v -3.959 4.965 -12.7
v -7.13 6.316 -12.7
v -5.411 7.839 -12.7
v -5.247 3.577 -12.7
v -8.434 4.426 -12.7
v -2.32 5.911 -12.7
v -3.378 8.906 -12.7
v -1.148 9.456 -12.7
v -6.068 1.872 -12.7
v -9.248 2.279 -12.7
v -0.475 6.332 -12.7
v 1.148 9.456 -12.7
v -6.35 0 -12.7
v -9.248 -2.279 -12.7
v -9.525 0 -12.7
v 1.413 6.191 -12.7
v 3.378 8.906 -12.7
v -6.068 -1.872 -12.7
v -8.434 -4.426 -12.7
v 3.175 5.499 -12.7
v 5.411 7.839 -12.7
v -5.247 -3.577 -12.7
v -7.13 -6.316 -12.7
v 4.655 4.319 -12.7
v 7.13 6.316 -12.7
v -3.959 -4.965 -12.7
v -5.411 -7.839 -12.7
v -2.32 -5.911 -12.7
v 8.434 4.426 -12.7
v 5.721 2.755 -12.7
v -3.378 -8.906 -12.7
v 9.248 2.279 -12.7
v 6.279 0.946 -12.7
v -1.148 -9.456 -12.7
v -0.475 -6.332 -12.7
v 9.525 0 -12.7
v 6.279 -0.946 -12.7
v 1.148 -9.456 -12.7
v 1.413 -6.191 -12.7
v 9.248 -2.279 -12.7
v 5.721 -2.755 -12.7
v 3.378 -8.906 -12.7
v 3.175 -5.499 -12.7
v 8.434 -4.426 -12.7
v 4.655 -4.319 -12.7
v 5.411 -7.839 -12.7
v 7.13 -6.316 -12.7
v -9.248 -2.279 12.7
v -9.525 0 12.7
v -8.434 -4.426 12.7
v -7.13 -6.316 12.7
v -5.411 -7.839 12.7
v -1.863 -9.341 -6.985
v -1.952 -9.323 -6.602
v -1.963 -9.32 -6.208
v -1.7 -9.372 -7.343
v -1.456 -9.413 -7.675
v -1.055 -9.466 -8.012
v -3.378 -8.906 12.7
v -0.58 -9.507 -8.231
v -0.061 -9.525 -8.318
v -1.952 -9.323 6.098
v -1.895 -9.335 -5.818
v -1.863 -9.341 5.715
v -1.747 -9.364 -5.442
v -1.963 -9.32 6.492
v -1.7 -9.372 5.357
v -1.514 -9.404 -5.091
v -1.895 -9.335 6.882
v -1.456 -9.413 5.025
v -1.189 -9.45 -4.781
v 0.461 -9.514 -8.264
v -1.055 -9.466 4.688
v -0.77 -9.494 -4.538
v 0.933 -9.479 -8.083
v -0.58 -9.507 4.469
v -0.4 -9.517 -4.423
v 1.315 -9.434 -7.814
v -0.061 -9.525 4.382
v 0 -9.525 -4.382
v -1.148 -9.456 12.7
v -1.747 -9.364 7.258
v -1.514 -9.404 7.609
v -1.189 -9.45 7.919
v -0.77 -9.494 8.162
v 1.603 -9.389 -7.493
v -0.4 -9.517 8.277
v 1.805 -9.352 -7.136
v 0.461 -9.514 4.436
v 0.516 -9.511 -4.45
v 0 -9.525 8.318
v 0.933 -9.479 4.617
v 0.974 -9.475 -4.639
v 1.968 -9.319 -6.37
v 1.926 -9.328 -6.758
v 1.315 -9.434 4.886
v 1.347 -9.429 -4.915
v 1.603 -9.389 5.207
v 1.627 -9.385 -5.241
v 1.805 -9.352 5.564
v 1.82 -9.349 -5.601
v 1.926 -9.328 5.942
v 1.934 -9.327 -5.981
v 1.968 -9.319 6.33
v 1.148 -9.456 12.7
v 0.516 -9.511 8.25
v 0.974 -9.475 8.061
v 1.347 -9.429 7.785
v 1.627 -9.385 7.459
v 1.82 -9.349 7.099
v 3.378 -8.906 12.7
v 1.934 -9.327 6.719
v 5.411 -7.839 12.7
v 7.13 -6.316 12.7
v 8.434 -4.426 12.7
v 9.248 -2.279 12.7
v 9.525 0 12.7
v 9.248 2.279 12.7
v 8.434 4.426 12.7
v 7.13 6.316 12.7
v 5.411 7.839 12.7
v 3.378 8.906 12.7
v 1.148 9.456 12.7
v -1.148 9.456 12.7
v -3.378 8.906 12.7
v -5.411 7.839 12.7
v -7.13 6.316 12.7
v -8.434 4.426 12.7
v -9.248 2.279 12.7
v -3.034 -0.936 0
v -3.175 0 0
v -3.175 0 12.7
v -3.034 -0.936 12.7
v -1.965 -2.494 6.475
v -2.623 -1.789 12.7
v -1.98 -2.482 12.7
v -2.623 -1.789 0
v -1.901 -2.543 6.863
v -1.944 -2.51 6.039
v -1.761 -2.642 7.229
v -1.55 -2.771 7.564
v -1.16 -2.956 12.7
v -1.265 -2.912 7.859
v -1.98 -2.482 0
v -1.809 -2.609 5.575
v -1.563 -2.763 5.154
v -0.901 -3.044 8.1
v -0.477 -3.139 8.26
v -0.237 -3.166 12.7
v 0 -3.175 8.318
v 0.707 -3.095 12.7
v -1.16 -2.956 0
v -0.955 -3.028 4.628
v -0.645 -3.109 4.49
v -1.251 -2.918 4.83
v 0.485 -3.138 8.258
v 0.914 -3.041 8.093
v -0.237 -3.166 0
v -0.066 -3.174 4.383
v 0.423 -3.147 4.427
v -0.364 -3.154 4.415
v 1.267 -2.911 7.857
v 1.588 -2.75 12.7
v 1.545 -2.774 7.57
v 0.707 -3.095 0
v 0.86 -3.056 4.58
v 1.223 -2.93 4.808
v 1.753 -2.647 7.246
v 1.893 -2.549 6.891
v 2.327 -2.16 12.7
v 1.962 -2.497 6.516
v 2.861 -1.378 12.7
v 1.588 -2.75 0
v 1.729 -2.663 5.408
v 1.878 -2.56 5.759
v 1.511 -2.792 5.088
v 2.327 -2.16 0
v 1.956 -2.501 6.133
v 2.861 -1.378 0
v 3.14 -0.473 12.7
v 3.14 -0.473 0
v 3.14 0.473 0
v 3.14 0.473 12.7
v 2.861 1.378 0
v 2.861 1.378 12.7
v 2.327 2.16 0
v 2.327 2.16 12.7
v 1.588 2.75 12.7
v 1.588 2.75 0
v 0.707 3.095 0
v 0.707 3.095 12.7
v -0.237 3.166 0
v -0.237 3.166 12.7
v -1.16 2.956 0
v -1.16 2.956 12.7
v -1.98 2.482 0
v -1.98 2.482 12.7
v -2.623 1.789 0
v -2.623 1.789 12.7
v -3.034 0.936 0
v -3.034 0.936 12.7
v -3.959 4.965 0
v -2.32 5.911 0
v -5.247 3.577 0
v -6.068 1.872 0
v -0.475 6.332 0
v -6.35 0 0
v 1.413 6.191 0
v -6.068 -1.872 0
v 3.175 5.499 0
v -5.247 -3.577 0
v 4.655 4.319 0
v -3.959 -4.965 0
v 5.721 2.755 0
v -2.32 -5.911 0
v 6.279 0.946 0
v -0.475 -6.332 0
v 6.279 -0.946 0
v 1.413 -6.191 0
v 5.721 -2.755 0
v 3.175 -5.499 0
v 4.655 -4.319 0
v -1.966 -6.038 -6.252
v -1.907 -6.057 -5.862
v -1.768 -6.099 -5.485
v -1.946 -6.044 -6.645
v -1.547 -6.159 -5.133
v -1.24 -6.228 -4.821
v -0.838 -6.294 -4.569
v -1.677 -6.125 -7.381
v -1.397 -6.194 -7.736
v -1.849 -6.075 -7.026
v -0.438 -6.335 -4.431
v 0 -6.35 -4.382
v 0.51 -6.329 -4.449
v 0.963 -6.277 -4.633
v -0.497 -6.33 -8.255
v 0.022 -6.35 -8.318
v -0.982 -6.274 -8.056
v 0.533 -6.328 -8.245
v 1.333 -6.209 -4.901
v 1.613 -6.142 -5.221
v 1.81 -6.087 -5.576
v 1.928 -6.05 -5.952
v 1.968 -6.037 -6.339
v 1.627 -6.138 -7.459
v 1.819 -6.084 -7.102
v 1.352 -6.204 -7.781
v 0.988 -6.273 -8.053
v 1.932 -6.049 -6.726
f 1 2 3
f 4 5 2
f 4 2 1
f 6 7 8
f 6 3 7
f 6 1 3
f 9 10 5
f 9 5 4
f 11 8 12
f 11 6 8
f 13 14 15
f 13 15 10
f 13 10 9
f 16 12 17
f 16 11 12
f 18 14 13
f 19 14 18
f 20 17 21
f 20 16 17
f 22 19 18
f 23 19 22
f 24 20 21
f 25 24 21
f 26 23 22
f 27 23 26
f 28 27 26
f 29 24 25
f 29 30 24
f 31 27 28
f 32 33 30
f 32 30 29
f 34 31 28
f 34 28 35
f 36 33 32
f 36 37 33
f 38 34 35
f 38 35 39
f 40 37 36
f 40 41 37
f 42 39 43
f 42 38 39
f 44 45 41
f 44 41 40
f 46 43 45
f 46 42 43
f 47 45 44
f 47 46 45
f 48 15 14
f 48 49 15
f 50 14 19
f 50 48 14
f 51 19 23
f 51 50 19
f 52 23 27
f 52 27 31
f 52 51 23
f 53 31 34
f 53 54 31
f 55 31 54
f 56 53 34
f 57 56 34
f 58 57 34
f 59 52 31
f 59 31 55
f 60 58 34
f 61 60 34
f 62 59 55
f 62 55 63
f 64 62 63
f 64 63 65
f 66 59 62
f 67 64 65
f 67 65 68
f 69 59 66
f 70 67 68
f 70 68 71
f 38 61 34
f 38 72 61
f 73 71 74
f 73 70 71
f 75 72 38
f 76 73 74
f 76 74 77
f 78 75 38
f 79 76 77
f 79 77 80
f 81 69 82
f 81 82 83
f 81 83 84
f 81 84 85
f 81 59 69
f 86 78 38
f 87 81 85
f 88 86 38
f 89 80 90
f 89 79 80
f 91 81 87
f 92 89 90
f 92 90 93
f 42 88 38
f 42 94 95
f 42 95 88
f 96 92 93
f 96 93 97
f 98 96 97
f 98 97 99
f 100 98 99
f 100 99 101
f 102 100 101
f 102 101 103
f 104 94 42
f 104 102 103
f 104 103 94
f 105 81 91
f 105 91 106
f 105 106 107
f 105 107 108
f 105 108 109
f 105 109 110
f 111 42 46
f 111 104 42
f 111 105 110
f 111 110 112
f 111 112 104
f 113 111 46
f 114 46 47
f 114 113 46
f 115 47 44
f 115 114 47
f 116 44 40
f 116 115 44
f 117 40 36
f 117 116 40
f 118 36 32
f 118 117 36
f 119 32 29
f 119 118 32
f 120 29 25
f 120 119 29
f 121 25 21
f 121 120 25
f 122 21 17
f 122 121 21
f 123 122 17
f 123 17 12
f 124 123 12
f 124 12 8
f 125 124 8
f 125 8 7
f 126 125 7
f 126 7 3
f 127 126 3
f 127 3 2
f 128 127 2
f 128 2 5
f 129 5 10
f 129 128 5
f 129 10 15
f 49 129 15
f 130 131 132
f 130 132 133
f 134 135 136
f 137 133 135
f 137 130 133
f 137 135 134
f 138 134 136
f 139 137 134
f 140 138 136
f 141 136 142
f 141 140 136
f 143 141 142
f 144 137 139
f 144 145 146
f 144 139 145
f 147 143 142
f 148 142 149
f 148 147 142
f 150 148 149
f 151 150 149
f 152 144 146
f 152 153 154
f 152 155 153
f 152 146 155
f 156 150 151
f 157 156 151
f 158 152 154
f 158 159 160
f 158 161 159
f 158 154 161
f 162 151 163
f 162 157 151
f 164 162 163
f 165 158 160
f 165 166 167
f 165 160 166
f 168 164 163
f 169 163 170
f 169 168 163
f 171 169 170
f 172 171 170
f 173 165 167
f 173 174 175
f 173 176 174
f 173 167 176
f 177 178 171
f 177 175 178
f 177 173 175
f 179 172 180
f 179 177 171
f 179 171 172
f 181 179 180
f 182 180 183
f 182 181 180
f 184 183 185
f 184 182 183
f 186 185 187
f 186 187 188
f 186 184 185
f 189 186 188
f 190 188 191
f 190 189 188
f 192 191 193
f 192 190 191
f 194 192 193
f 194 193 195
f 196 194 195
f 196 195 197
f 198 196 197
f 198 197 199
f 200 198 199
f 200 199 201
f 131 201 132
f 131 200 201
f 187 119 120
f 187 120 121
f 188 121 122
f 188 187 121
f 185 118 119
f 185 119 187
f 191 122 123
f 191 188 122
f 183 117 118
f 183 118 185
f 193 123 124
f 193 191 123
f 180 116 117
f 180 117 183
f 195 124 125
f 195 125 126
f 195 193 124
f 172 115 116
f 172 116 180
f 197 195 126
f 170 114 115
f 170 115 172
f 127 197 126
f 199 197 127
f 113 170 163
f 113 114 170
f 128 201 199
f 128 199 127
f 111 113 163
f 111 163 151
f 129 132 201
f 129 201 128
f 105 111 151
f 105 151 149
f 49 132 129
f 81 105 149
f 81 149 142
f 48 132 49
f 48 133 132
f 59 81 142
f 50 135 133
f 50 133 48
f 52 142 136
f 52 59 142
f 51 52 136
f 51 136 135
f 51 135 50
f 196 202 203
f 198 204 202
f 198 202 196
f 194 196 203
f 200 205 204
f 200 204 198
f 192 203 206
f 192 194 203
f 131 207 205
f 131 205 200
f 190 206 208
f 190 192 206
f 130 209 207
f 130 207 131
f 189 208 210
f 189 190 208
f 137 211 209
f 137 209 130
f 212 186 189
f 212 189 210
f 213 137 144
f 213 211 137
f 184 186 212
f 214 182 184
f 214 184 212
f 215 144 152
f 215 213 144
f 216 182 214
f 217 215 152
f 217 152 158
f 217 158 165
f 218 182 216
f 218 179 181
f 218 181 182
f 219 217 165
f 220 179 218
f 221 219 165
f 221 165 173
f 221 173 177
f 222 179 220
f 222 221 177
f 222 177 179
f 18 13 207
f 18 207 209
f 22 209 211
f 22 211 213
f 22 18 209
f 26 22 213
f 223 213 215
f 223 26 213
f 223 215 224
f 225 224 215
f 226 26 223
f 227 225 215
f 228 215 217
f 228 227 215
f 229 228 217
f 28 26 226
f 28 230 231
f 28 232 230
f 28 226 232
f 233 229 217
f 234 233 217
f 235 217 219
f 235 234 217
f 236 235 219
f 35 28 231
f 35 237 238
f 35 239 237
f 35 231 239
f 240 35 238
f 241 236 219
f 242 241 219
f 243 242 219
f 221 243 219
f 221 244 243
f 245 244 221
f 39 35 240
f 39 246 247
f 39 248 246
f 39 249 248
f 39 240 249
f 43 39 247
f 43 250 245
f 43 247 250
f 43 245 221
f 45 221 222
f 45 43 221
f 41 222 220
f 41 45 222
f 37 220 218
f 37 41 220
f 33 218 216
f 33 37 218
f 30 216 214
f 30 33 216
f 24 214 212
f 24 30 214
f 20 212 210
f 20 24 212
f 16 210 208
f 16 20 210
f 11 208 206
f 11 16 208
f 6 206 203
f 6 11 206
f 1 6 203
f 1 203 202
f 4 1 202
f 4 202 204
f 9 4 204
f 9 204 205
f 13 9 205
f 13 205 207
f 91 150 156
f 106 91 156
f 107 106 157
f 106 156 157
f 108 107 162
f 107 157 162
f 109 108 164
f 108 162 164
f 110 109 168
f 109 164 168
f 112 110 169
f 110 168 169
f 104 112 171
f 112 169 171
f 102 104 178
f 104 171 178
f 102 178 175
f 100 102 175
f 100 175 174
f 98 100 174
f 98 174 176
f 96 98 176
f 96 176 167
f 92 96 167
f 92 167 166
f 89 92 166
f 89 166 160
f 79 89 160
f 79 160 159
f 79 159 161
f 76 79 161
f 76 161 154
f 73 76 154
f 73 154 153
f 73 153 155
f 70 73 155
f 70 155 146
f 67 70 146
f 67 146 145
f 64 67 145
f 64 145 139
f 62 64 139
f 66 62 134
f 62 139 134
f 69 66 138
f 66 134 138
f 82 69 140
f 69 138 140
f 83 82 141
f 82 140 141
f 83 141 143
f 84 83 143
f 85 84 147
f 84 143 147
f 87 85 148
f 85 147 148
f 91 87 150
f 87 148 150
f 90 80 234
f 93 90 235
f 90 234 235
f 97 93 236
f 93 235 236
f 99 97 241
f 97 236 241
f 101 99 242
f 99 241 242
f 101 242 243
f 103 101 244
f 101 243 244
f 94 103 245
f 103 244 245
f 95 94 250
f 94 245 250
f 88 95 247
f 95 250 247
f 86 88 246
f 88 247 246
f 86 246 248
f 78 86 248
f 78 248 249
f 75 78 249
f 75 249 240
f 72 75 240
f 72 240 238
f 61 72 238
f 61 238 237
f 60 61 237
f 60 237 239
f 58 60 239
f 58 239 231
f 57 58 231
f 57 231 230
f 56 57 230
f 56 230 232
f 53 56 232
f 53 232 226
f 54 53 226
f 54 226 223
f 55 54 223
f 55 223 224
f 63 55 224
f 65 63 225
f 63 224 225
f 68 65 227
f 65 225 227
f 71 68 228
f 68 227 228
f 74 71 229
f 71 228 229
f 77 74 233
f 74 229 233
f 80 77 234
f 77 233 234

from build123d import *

# Parameters (mm, degrees)
CUT_EXTRUDE1_REACH      = 20.513
CUT_EXTRUDE1_END_RADIUS = 9.525
SKETCH2_R               = 1.9685


with BuildPart() as part:
    # Sketch1 → Revolve1 (revolve)
    with BuildSketch(Plane(origin=(0, 0, 0), x_dir=(0, 0, -1), z_dir=(1, 0, 0))):
        Polygon((0, 3.175), (0, 6.35), (12.7, 6.35), (12.7, 9.525), (-12.7, 9.525), (-12.7, 3.175), align=None)
    revolve(axis=Axis((0, 0, 0), (0, 0, 1)))

    # Cut-Extrude1: up to this cylinder (the profile starts inside it)
    cut_extrude1_end = Plane(origin=(0, 0, 0), z_dir=(0, 0, -1)) * Cylinder(CUT_EXTRUDE1_END_RADIUS, 73.776, mode=Mode.PRIVATE)
    # Sketch2 → Cut-Extrude1 (cut, up to the surface)
    with BuildSketch(Plane(origin=(0, 0, 0), x_dir=(1, 0, 0), z_dir=(0, 1, 0)), mode=Mode.PRIVATE) as cut_extrude1_sk1:
        with Locations((0, -6.35)):
            Circle(SKETCH2_R)
    cut_extrude1_tool1 = extrude(cut_extrude1_sk1.sketch, amount=-CUT_EXTRUDE1_REACH, mode=Mode.PRIVATE) & cut_extrude1_end
    add(cut_extrude1_tool1.solids().sort_by_distance((0, 0, 6.35))[0], mode=Mode.SUBTRACT)
    # Sketch2 → Cut-Extrude1 (cut, up to the surface)
    with BuildSketch(Plane(origin=(0, 0, 0), x_dir=(1, 0, 0), z_dir=(0, 1, 0)), mode=Mode.PRIVATE) as cut_extrude1_sk2:
        with Locations((0, 6.35)):
            Circle(SKETCH2_R)
    cut_extrude1_tool2 = extrude(cut_extrude1_sk2.sketch, amount=-CUT_EXTRUDE1_REACH, mode=Mode.PRIVATE) & cut_extrude1_end
    add(cut_extrude1_tool2.solids().sort_by_distance((0, 0, -6.35))[0], mode=Mode.SUBTRACT)


solid = part.part
